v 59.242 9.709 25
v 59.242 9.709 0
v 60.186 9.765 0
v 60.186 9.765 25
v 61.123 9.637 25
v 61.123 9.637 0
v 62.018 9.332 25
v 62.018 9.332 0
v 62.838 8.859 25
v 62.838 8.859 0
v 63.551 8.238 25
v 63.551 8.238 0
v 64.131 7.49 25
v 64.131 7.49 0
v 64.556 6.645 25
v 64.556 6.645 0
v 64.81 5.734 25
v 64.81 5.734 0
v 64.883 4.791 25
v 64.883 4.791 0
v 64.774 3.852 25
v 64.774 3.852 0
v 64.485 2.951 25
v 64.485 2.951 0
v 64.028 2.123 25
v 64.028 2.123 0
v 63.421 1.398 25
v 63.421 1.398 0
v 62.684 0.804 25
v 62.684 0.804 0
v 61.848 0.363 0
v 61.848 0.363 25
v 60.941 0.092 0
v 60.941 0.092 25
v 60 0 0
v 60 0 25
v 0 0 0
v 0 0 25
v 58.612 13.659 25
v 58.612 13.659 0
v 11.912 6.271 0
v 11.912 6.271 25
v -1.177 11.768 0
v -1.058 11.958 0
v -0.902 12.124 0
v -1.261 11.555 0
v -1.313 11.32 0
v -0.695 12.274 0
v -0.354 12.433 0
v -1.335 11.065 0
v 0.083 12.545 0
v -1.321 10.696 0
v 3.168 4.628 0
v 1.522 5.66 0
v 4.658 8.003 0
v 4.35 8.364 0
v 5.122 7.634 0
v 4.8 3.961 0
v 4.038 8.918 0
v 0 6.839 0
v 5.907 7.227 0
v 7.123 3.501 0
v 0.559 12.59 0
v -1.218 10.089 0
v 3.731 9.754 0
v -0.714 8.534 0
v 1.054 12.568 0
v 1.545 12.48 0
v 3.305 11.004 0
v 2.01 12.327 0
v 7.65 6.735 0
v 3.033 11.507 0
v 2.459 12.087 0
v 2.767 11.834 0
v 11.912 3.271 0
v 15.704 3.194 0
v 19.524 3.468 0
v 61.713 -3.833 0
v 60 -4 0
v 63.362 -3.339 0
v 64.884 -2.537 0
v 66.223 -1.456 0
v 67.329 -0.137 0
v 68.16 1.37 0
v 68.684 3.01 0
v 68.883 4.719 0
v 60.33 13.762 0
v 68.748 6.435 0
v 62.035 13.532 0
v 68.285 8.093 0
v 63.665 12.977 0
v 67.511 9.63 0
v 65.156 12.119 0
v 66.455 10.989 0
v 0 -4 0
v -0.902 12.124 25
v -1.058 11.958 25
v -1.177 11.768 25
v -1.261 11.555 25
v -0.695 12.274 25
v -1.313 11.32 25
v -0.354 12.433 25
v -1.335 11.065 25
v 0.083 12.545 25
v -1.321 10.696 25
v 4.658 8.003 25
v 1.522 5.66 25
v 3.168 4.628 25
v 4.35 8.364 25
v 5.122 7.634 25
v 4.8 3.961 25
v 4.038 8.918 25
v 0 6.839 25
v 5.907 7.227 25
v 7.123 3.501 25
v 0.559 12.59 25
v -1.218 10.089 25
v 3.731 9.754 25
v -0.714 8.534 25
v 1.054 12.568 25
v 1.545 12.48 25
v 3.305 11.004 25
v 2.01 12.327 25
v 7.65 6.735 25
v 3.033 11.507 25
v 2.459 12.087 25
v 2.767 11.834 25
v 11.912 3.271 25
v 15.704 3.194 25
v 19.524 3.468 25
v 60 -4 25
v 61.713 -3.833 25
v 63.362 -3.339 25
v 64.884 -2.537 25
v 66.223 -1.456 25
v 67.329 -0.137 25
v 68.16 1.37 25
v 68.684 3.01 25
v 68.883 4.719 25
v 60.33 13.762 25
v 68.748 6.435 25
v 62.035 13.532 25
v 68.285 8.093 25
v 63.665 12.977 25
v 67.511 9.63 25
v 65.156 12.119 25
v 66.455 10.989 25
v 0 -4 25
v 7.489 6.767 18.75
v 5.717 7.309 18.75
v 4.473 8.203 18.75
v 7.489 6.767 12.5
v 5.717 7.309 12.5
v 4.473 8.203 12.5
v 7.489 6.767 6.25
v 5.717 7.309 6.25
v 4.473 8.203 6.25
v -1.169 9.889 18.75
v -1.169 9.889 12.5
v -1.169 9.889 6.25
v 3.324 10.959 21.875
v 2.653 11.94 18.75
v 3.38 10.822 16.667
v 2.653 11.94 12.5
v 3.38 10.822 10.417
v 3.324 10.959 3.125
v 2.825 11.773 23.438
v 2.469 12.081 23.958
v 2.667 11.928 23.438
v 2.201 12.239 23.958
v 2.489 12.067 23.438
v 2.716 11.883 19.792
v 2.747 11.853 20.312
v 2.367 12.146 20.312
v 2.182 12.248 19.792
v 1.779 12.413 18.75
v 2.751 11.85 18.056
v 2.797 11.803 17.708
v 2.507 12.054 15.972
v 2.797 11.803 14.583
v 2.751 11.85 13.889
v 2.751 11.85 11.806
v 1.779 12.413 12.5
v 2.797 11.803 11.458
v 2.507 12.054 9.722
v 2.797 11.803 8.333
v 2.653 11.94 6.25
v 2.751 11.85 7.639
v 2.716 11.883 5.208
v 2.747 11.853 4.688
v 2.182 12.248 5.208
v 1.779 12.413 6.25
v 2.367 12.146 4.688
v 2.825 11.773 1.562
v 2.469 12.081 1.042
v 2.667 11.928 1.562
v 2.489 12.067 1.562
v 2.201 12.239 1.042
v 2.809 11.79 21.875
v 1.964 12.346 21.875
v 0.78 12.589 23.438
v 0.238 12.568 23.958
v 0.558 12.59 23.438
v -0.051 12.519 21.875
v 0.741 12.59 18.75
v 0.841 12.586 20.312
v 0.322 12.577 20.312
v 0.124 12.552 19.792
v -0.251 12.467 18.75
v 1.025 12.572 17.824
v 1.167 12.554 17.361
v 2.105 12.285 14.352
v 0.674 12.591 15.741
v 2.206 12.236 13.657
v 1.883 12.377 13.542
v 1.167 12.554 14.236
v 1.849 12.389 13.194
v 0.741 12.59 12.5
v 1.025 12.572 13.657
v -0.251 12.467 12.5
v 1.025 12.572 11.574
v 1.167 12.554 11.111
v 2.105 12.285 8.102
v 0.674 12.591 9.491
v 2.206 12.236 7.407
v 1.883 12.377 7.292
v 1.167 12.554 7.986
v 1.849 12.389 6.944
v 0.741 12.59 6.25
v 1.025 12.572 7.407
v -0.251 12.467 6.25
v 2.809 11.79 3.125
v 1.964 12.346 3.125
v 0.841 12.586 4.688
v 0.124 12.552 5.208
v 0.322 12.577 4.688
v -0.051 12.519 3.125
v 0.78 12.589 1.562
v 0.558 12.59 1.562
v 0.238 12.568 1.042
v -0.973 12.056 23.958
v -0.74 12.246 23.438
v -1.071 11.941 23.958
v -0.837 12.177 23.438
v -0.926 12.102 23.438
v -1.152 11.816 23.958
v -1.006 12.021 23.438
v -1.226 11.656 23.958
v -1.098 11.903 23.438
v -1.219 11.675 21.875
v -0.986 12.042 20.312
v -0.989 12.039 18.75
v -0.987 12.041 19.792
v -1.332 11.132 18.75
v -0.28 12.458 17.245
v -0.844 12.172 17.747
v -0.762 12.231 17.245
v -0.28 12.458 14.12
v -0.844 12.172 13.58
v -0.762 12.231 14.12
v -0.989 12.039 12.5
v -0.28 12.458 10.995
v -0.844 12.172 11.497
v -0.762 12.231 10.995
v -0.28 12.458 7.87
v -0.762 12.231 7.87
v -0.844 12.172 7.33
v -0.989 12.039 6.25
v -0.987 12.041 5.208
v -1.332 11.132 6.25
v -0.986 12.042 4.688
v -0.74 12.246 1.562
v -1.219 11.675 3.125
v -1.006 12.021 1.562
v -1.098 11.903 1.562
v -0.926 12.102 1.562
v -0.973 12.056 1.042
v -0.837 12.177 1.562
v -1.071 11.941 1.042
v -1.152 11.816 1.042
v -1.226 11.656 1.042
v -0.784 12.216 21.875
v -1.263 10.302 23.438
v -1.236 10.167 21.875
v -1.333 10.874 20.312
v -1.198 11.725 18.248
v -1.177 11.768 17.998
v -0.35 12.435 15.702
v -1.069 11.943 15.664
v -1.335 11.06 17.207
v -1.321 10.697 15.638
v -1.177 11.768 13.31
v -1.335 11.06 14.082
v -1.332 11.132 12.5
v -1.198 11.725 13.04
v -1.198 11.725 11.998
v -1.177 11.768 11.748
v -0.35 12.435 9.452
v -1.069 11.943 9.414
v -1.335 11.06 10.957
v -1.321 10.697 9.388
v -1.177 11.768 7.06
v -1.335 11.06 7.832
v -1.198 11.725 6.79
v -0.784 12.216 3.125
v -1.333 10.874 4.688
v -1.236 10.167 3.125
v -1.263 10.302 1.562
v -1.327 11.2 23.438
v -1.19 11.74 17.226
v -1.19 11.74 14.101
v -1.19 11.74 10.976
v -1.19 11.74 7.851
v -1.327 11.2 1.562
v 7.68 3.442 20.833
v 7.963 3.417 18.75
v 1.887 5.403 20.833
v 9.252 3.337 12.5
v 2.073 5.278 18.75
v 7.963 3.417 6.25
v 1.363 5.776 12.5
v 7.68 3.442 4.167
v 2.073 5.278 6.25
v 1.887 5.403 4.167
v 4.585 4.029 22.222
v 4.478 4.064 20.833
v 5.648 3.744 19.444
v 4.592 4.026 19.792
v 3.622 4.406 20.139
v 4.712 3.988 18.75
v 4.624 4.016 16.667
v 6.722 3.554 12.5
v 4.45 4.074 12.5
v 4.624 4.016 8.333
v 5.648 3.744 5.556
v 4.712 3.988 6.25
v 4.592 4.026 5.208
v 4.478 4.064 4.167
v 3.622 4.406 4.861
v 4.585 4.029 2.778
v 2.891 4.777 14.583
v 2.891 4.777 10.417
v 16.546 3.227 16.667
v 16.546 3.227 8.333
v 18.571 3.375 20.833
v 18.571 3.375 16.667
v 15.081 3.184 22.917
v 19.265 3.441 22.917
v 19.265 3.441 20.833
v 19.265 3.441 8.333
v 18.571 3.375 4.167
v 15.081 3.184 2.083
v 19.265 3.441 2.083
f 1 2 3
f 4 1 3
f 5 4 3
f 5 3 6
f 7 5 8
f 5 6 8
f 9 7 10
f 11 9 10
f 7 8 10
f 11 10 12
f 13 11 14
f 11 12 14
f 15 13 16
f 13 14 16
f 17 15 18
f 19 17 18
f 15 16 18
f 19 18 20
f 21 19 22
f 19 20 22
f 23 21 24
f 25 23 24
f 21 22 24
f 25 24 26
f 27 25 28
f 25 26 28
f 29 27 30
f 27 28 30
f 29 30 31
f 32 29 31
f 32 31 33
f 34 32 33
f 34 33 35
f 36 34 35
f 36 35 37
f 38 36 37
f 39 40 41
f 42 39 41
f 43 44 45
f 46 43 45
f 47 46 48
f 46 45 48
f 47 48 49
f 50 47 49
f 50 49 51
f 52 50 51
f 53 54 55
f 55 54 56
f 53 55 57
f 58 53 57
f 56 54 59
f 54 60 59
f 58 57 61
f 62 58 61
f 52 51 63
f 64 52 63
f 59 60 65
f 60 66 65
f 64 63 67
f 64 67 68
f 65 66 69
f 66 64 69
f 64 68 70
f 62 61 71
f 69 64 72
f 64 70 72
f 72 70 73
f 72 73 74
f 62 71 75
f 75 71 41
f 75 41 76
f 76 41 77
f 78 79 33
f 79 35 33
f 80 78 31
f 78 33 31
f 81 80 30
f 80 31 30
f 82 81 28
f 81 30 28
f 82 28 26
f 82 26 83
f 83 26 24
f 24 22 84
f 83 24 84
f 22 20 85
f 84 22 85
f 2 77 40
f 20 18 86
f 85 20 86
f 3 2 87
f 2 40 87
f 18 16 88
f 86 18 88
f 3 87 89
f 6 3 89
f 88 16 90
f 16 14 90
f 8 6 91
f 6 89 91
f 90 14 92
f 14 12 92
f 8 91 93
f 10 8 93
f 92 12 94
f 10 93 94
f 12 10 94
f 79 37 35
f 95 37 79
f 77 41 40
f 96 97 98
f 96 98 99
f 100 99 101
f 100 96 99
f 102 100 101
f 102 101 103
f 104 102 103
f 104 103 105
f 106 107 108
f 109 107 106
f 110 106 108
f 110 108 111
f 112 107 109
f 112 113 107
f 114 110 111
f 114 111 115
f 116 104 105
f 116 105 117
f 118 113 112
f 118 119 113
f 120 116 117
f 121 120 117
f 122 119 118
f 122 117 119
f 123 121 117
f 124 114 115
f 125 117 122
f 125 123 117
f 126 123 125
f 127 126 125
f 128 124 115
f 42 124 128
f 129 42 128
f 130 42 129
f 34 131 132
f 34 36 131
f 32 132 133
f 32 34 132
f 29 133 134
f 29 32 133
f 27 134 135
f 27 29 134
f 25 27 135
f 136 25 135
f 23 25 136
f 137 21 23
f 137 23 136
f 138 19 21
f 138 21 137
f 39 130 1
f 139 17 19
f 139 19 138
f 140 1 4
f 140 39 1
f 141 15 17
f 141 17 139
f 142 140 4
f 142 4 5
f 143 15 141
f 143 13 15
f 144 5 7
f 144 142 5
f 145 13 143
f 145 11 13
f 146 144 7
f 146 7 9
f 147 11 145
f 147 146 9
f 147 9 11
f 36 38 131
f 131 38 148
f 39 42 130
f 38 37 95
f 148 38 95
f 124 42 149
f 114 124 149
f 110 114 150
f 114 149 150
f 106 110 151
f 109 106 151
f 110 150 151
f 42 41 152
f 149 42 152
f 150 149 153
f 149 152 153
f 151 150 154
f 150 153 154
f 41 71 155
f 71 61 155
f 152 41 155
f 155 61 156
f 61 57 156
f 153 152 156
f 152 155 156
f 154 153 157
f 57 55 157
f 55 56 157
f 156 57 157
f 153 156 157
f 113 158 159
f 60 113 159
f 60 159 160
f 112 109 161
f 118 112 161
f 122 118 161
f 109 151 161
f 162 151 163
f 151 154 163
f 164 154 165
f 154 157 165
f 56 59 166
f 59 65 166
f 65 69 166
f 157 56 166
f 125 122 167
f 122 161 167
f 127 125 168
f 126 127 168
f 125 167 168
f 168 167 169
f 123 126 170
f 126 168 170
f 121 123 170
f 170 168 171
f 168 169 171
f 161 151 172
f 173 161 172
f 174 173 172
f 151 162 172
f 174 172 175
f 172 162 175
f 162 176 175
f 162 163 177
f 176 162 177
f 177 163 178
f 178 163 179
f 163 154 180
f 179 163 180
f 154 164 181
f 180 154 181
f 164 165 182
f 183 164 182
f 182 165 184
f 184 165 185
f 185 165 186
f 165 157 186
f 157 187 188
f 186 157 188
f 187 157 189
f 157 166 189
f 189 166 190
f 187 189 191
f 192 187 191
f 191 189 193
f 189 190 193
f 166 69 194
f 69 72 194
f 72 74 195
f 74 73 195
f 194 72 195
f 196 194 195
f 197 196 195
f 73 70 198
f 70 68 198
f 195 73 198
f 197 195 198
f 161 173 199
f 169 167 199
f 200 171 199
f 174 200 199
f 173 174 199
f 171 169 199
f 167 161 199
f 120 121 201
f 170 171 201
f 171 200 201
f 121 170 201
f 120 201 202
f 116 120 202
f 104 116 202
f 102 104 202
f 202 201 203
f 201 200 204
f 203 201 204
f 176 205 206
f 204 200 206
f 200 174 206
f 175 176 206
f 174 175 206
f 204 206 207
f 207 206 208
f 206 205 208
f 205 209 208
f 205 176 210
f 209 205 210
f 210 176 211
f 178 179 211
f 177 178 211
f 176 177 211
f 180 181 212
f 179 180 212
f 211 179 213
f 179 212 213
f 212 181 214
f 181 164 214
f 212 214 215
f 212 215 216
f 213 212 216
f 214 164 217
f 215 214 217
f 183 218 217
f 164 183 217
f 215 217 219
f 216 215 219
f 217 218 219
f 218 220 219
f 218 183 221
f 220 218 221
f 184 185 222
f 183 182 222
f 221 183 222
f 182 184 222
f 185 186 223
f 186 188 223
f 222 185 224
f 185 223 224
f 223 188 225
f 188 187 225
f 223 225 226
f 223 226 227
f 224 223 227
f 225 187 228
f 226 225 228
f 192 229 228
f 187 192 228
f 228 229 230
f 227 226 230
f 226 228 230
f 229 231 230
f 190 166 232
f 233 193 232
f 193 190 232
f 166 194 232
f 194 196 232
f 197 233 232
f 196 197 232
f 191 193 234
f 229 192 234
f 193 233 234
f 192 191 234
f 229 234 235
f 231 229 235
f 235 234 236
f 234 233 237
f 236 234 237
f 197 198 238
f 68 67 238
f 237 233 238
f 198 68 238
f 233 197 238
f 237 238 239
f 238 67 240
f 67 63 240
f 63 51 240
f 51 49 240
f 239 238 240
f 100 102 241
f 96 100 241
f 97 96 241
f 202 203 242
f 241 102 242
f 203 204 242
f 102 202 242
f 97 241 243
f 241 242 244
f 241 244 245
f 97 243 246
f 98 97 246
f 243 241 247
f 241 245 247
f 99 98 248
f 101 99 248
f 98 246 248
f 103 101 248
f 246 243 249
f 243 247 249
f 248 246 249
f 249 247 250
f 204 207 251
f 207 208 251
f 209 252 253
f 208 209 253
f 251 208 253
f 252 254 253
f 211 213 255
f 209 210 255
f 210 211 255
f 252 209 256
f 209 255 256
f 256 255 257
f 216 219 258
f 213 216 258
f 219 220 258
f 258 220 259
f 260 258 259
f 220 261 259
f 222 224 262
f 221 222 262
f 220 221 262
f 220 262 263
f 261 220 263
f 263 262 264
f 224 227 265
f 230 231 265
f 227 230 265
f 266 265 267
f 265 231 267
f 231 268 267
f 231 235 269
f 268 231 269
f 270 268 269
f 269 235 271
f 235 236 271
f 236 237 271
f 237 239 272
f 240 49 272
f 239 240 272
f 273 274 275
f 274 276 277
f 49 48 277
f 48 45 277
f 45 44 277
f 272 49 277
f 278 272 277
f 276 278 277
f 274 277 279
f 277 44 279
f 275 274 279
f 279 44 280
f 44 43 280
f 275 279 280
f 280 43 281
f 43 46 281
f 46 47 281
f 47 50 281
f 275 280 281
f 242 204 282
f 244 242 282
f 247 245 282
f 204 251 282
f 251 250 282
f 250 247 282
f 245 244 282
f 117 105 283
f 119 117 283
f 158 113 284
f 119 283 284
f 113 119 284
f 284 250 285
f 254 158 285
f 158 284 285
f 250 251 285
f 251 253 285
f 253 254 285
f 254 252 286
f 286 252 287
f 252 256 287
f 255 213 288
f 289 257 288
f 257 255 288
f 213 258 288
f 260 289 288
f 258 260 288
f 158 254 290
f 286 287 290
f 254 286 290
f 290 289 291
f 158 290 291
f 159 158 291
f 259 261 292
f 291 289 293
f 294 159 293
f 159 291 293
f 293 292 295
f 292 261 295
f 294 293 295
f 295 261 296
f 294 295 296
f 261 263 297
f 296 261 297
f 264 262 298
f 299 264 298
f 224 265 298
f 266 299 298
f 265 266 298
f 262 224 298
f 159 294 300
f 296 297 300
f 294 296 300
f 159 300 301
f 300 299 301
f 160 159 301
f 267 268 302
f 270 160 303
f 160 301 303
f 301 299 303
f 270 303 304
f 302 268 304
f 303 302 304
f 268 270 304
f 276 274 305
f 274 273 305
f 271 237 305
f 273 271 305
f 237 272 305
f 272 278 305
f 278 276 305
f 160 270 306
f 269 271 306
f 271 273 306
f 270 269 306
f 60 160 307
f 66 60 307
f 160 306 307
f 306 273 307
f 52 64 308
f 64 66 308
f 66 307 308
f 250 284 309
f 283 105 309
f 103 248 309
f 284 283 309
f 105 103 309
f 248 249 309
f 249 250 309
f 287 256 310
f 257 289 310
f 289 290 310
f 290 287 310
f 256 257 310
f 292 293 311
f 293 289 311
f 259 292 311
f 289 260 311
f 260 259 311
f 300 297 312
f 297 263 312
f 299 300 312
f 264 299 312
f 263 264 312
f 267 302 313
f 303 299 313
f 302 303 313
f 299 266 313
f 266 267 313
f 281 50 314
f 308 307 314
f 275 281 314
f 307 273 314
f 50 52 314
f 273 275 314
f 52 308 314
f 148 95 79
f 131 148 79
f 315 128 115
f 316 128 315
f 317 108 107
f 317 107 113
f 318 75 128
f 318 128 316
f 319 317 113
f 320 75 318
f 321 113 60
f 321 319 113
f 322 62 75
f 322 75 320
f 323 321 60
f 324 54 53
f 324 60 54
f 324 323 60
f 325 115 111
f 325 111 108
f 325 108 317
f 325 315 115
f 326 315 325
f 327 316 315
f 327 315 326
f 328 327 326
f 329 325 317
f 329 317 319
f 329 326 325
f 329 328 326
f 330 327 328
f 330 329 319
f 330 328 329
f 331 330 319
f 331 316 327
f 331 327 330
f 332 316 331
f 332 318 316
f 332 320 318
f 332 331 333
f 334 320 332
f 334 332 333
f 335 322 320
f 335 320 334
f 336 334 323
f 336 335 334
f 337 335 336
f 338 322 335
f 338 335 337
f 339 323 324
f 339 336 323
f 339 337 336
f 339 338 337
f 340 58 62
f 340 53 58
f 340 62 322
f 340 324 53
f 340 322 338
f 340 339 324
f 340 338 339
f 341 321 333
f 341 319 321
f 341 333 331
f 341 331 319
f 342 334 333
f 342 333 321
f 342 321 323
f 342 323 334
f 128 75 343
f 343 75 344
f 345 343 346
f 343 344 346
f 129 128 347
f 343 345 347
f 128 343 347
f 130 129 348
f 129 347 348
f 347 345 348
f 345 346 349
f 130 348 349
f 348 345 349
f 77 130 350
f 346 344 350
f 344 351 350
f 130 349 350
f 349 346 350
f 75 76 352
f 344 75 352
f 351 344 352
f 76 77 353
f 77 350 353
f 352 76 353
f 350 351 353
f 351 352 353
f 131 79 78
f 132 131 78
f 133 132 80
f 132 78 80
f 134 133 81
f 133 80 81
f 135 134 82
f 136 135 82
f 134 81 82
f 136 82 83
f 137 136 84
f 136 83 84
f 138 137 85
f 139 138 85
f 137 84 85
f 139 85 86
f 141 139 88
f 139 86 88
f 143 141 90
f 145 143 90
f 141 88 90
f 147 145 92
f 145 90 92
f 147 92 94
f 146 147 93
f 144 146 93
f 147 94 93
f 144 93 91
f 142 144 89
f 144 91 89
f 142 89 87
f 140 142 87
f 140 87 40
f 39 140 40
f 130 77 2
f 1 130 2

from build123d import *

# Parameters (mm, degrees)
F1_DEPTH = 25


with BuildPart() as f1:
    # F0 (on Top) → F1 (new body)
    with BuildSketch(Plane.XY):
        with BuildLine():
            Line((60, 0), (0, 0))
            Line((0, 0), (0, -4))
            Line((0, -4), (60, -4))
            ThreePointArc((60, -4), (68.8568799, 5.5804518491), (58.6117872519, 13.6592794761))
            Line((58.6117872519, 13.6592794761), (11.9117473774, 6.2713553941))
            add(Edge.make_bspline(
                [(11.9117473774, 6.2713553941), (8.8067651133, 6.4972680654), (3.4183678047, 6.889317722), (3.7834139619, 12.7129074337), (-2.6294865061, 12.8738821695), (-0.9292671165, 8.97201687), (0, 6.8394243717)],
                knots=[0, 0, 0, 0, 0.3073363281, 0.5333525612, 0.7449504914, 1, 1, 1, 1], degree=3))
            add(Edge.make_bspline(
                [(11.9117473774, 3.2713553941), (9.2304258246, 3.3113469763), (4.3088828931, 3.3847511857), (1.3478315059, 5.7587922269), (0, 6.8394243717)],
                knots=[0, 0, 0, 0, 0.5448131999, 1, 1, 1, 1], degree=3))
            add(Edge.make_bspline(
                [(11.9117473774, 3.2713553941), (13.366720079, 3.1984004905), (15.9912041224, 3.090620641), (19.5147760207, 3.4659632587), (19.5237015597, 3.4678606036), (19.5238625798, 3.4678943344)],
                knots=[0, 0, 0, 0, 0.5502212285, 0.9918832508, 1, 1, 1, 1], degree=3))
            Line((19.5238625798, 3.4678943344), (59.2417967893, 9.7091991862))
            ThreePointArc((59.2417967893, 9.7091991862), (64.8693793482, 5.2644598745), (60, 0))
        make_face()
    extrude(amount=F1_DEPTH)


solid = f1.part
